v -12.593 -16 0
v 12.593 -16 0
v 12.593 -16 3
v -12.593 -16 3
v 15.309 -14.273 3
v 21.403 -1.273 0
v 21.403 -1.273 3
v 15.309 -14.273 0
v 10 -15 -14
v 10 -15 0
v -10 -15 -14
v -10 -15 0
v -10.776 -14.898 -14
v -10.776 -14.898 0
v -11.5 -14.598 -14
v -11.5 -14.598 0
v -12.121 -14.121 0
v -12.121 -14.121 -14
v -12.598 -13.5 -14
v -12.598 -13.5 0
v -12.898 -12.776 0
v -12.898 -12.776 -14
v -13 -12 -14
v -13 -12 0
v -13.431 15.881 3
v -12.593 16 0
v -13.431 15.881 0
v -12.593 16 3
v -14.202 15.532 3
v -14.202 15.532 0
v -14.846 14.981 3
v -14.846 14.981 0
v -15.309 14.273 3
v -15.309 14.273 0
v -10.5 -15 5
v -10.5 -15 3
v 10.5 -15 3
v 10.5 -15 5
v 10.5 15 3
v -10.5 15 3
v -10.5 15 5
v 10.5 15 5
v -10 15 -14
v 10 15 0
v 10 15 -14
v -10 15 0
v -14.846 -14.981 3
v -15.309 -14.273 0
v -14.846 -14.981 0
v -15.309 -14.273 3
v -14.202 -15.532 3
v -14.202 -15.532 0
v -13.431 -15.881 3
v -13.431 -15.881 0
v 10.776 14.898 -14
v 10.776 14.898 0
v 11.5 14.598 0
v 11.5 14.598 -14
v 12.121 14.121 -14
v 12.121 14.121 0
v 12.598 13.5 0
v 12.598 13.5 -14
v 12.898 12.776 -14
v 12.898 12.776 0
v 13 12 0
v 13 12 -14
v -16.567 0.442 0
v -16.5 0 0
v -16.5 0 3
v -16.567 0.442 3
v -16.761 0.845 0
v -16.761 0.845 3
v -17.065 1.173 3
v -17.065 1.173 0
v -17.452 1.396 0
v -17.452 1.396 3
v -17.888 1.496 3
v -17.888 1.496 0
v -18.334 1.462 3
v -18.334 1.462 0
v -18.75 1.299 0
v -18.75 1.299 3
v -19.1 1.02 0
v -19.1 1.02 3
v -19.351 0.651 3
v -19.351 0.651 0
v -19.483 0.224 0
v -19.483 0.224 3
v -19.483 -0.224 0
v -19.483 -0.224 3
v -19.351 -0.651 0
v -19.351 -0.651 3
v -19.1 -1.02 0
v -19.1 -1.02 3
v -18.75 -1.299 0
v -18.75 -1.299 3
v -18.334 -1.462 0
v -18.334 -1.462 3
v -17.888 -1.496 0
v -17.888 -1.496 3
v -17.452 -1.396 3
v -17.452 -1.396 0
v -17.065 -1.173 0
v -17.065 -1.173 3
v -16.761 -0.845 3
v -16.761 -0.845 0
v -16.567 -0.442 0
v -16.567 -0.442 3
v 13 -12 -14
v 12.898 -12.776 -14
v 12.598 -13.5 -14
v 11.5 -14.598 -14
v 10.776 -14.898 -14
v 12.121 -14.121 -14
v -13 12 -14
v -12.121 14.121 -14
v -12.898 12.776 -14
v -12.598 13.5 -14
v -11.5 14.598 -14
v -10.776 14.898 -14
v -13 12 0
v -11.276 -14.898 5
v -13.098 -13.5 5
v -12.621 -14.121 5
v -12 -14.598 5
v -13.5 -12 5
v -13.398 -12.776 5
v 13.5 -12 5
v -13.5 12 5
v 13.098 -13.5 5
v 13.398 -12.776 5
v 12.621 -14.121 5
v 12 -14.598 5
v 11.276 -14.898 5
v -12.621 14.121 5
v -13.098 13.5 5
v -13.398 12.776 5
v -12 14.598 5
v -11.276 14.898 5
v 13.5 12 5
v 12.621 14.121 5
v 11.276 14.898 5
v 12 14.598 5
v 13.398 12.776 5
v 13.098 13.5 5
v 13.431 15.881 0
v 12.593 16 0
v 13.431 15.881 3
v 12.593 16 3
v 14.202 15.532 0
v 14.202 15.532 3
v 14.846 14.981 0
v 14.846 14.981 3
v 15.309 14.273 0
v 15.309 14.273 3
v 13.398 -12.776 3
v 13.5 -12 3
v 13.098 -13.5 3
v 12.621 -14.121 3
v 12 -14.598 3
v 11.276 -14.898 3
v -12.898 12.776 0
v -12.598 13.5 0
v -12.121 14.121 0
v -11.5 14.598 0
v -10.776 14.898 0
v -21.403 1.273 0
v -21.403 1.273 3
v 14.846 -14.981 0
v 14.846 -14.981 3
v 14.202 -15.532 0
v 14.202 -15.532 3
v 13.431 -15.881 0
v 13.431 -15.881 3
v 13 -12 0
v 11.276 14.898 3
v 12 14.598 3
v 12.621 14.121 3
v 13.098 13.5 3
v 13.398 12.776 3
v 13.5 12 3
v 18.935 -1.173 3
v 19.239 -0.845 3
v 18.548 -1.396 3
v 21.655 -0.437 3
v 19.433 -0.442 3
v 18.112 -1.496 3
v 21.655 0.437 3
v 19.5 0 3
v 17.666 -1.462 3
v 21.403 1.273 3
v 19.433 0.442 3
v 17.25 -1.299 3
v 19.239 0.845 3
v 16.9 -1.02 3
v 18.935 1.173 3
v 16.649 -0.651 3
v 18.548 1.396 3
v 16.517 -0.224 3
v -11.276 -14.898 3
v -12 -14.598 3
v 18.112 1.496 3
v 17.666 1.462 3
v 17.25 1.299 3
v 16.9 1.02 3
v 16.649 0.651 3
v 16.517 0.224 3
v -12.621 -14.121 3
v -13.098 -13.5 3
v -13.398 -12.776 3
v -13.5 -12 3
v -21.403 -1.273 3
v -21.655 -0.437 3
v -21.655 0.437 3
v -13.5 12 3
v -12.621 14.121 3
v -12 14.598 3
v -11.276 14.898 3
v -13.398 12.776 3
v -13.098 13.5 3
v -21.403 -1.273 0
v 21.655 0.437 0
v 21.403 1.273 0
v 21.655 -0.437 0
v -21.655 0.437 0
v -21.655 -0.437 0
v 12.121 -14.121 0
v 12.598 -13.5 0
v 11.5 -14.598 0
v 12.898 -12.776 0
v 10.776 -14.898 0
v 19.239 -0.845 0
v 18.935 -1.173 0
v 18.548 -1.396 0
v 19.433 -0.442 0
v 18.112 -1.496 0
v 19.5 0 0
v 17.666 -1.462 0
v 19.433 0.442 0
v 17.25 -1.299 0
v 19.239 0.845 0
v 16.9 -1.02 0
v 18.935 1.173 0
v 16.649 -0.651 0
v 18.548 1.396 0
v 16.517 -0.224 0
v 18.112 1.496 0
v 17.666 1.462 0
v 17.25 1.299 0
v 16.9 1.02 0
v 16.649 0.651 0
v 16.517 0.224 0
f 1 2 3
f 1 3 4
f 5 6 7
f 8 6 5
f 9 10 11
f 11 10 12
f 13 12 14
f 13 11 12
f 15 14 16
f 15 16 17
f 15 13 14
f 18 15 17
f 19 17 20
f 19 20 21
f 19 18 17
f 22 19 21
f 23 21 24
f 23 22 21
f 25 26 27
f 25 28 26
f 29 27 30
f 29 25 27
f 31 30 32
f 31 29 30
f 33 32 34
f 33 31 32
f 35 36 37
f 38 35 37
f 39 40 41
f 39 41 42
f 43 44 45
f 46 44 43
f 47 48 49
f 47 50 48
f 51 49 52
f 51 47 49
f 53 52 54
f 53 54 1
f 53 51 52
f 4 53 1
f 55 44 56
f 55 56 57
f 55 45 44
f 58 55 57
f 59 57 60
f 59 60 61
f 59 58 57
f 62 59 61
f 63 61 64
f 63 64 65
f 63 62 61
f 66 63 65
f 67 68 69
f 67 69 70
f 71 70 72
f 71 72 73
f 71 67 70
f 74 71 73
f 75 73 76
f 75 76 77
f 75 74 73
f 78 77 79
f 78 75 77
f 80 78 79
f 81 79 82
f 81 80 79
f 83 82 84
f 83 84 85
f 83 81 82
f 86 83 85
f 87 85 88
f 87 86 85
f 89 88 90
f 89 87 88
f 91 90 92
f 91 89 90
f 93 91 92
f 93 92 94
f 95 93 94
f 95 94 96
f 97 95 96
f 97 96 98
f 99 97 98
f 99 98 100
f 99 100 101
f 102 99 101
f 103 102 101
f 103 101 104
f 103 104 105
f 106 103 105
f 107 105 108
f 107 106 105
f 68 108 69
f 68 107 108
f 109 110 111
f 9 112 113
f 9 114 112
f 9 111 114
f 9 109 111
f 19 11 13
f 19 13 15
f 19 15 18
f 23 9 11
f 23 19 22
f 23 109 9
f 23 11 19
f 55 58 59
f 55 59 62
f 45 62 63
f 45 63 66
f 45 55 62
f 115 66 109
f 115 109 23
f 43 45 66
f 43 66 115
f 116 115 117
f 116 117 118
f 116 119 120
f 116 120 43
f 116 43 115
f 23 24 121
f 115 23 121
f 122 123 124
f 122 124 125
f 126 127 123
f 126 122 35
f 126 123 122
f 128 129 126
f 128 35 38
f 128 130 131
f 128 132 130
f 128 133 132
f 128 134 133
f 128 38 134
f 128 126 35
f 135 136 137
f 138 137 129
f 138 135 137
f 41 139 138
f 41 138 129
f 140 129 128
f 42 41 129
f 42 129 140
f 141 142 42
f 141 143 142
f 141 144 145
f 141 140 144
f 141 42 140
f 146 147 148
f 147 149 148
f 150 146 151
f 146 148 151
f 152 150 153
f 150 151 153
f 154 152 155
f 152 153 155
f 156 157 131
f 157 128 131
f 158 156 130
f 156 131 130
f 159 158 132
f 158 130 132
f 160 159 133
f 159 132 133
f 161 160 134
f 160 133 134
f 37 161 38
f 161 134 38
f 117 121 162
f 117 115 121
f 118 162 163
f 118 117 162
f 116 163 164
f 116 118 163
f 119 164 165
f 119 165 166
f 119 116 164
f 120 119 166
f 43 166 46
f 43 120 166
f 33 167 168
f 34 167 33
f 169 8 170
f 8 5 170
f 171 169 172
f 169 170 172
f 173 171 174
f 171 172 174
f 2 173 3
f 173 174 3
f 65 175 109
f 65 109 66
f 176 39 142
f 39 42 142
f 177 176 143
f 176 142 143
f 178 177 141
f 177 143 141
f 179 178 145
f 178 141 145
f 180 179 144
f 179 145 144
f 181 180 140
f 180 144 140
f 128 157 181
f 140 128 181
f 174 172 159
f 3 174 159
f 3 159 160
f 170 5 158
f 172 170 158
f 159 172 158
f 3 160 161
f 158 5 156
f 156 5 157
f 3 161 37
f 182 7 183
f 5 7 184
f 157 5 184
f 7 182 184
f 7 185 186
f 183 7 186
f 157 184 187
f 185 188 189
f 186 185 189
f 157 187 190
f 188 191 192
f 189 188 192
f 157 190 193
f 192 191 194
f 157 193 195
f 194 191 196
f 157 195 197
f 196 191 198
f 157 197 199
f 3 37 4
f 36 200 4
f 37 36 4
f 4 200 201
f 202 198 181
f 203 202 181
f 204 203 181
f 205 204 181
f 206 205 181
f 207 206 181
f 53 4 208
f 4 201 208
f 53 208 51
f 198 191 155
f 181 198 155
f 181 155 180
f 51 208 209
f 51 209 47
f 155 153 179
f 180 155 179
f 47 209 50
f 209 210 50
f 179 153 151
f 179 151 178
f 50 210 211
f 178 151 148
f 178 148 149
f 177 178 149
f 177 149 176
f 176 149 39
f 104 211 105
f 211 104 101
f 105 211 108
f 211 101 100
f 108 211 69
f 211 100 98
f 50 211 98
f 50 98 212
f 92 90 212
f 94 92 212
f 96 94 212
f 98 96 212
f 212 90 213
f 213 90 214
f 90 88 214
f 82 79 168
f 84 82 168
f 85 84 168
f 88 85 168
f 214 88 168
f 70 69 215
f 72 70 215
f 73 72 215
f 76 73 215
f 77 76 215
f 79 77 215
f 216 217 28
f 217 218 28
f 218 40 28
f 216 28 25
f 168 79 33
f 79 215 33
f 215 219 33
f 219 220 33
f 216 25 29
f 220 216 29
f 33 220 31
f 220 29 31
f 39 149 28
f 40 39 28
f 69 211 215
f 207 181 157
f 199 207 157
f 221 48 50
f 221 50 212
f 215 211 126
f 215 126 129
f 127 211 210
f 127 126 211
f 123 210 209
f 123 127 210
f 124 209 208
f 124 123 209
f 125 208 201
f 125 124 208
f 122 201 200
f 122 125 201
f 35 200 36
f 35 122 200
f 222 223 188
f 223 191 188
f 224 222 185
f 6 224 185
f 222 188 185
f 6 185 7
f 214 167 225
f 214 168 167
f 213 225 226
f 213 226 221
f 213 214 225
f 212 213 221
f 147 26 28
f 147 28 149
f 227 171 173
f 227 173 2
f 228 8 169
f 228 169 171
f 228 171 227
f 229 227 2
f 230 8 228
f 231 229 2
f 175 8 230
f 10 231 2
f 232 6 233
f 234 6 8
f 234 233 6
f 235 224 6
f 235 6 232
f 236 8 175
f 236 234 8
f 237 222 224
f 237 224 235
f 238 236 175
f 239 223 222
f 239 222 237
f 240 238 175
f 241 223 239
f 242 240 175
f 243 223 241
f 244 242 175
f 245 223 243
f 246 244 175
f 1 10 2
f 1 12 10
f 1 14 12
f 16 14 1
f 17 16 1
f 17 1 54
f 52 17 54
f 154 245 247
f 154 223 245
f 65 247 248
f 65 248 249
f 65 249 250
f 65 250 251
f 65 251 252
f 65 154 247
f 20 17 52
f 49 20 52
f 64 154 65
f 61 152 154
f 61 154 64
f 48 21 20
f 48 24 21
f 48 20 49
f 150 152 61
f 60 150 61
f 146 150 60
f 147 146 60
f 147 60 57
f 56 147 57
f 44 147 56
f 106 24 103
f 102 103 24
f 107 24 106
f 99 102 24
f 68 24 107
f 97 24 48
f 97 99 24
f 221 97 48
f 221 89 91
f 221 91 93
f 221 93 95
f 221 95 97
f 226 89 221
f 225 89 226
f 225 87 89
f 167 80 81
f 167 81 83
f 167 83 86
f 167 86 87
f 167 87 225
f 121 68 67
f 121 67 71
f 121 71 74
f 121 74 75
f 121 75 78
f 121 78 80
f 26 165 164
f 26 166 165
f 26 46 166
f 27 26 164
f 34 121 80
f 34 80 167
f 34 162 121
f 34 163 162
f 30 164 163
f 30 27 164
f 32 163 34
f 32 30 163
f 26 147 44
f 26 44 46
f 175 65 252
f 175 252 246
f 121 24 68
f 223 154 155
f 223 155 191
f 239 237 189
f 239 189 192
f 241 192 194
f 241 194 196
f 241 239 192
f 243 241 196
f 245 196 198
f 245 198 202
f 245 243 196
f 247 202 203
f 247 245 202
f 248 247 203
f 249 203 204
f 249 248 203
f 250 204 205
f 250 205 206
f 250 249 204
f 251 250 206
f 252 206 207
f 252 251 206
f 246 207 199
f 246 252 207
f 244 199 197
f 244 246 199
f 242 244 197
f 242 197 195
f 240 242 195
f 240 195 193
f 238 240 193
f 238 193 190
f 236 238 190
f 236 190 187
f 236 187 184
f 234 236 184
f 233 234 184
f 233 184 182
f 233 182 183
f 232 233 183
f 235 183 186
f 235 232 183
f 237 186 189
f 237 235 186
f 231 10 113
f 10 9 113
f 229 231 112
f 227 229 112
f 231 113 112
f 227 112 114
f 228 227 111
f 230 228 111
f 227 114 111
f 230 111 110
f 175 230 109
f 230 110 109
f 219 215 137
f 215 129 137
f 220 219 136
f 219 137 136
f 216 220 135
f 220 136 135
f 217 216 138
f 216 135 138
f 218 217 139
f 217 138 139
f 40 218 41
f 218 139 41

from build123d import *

# Parameters (mm, degrees)
SKETCH1_R           = 1.5
BOSS_EXTRUDE1_DEPTH = 3
SKETCH4_W           = 27
SKETCH4_H           = 30
BOSS_EXTRUDE2_DEPTH = 2
SKETCH5_W           = 26
SKETCH5_H           = 30
BOSS_EXTRUDE3_DEPTH = 14
FILLET1_R           = 3


with BuildPart() as part:
    # Sketch1 → Boss-Extrude1 (new body)
    with BuildSketch(Plane.XY):
        Polygon((-14.5, 16), (14.5, 16), (22, 0), (14.5, -16), (-14.5, -16), (-22, 0), align=None)
        with Locations((-18, 0)):
            Circle(SKETCH1_R, mode=Mode.SUBTRACT)
        with Locations((18, 0)):
            Circle(SKETCH1_R, mode=Mode.SUBTRACT)
    extrude(amount=BOSS_EXTRUDE1_DEPTH)

    # Sketch4 → Boss-Extrude2 (add)
    with BuildSketch(Plane.XY.offset(3)):
        Rectangle(SKETCH4_W, SKETCH4_H)
    extrude(amount=BOSS_EXTRUDE2_DEPTH)

    # Sketch5 → Boss-Extrude3 (add)
    with BuildSketch(Plane(origin=(0, 0, 0), x_dir=(-1, 0, 0), z_dir=(0, 0, -1))):
        Rectangle(SKETCH5_W, SKETCH5_H)
    extrude(amount=BOSS_EXTRUDE3_DEPTH)

    # Fillet1
    fillet1_edges = [part.edges().sort_by_distance(p)[0] for p in [
        (-14.5, 16, 1.5),
        (14.5, 16, 1.5),
        (22, 0, 1.5),
        (14.5, -16, 1.5),
        (-14.5, -16, 1.5),
        (-22, 0, 1.5),
        (13.5, -15, 4),
        (13.5, 15, 4),
        (-13.5, 15, 4),
        (-13.5, -15, 4),
        (-13, -15, -7),
        (-13, 15, -7),
        (13, 15, -7),
        (13, -15, -7),
    ]]
    fillet(fillet1_edges, radius=FILLET1_R)


solid = part.part
